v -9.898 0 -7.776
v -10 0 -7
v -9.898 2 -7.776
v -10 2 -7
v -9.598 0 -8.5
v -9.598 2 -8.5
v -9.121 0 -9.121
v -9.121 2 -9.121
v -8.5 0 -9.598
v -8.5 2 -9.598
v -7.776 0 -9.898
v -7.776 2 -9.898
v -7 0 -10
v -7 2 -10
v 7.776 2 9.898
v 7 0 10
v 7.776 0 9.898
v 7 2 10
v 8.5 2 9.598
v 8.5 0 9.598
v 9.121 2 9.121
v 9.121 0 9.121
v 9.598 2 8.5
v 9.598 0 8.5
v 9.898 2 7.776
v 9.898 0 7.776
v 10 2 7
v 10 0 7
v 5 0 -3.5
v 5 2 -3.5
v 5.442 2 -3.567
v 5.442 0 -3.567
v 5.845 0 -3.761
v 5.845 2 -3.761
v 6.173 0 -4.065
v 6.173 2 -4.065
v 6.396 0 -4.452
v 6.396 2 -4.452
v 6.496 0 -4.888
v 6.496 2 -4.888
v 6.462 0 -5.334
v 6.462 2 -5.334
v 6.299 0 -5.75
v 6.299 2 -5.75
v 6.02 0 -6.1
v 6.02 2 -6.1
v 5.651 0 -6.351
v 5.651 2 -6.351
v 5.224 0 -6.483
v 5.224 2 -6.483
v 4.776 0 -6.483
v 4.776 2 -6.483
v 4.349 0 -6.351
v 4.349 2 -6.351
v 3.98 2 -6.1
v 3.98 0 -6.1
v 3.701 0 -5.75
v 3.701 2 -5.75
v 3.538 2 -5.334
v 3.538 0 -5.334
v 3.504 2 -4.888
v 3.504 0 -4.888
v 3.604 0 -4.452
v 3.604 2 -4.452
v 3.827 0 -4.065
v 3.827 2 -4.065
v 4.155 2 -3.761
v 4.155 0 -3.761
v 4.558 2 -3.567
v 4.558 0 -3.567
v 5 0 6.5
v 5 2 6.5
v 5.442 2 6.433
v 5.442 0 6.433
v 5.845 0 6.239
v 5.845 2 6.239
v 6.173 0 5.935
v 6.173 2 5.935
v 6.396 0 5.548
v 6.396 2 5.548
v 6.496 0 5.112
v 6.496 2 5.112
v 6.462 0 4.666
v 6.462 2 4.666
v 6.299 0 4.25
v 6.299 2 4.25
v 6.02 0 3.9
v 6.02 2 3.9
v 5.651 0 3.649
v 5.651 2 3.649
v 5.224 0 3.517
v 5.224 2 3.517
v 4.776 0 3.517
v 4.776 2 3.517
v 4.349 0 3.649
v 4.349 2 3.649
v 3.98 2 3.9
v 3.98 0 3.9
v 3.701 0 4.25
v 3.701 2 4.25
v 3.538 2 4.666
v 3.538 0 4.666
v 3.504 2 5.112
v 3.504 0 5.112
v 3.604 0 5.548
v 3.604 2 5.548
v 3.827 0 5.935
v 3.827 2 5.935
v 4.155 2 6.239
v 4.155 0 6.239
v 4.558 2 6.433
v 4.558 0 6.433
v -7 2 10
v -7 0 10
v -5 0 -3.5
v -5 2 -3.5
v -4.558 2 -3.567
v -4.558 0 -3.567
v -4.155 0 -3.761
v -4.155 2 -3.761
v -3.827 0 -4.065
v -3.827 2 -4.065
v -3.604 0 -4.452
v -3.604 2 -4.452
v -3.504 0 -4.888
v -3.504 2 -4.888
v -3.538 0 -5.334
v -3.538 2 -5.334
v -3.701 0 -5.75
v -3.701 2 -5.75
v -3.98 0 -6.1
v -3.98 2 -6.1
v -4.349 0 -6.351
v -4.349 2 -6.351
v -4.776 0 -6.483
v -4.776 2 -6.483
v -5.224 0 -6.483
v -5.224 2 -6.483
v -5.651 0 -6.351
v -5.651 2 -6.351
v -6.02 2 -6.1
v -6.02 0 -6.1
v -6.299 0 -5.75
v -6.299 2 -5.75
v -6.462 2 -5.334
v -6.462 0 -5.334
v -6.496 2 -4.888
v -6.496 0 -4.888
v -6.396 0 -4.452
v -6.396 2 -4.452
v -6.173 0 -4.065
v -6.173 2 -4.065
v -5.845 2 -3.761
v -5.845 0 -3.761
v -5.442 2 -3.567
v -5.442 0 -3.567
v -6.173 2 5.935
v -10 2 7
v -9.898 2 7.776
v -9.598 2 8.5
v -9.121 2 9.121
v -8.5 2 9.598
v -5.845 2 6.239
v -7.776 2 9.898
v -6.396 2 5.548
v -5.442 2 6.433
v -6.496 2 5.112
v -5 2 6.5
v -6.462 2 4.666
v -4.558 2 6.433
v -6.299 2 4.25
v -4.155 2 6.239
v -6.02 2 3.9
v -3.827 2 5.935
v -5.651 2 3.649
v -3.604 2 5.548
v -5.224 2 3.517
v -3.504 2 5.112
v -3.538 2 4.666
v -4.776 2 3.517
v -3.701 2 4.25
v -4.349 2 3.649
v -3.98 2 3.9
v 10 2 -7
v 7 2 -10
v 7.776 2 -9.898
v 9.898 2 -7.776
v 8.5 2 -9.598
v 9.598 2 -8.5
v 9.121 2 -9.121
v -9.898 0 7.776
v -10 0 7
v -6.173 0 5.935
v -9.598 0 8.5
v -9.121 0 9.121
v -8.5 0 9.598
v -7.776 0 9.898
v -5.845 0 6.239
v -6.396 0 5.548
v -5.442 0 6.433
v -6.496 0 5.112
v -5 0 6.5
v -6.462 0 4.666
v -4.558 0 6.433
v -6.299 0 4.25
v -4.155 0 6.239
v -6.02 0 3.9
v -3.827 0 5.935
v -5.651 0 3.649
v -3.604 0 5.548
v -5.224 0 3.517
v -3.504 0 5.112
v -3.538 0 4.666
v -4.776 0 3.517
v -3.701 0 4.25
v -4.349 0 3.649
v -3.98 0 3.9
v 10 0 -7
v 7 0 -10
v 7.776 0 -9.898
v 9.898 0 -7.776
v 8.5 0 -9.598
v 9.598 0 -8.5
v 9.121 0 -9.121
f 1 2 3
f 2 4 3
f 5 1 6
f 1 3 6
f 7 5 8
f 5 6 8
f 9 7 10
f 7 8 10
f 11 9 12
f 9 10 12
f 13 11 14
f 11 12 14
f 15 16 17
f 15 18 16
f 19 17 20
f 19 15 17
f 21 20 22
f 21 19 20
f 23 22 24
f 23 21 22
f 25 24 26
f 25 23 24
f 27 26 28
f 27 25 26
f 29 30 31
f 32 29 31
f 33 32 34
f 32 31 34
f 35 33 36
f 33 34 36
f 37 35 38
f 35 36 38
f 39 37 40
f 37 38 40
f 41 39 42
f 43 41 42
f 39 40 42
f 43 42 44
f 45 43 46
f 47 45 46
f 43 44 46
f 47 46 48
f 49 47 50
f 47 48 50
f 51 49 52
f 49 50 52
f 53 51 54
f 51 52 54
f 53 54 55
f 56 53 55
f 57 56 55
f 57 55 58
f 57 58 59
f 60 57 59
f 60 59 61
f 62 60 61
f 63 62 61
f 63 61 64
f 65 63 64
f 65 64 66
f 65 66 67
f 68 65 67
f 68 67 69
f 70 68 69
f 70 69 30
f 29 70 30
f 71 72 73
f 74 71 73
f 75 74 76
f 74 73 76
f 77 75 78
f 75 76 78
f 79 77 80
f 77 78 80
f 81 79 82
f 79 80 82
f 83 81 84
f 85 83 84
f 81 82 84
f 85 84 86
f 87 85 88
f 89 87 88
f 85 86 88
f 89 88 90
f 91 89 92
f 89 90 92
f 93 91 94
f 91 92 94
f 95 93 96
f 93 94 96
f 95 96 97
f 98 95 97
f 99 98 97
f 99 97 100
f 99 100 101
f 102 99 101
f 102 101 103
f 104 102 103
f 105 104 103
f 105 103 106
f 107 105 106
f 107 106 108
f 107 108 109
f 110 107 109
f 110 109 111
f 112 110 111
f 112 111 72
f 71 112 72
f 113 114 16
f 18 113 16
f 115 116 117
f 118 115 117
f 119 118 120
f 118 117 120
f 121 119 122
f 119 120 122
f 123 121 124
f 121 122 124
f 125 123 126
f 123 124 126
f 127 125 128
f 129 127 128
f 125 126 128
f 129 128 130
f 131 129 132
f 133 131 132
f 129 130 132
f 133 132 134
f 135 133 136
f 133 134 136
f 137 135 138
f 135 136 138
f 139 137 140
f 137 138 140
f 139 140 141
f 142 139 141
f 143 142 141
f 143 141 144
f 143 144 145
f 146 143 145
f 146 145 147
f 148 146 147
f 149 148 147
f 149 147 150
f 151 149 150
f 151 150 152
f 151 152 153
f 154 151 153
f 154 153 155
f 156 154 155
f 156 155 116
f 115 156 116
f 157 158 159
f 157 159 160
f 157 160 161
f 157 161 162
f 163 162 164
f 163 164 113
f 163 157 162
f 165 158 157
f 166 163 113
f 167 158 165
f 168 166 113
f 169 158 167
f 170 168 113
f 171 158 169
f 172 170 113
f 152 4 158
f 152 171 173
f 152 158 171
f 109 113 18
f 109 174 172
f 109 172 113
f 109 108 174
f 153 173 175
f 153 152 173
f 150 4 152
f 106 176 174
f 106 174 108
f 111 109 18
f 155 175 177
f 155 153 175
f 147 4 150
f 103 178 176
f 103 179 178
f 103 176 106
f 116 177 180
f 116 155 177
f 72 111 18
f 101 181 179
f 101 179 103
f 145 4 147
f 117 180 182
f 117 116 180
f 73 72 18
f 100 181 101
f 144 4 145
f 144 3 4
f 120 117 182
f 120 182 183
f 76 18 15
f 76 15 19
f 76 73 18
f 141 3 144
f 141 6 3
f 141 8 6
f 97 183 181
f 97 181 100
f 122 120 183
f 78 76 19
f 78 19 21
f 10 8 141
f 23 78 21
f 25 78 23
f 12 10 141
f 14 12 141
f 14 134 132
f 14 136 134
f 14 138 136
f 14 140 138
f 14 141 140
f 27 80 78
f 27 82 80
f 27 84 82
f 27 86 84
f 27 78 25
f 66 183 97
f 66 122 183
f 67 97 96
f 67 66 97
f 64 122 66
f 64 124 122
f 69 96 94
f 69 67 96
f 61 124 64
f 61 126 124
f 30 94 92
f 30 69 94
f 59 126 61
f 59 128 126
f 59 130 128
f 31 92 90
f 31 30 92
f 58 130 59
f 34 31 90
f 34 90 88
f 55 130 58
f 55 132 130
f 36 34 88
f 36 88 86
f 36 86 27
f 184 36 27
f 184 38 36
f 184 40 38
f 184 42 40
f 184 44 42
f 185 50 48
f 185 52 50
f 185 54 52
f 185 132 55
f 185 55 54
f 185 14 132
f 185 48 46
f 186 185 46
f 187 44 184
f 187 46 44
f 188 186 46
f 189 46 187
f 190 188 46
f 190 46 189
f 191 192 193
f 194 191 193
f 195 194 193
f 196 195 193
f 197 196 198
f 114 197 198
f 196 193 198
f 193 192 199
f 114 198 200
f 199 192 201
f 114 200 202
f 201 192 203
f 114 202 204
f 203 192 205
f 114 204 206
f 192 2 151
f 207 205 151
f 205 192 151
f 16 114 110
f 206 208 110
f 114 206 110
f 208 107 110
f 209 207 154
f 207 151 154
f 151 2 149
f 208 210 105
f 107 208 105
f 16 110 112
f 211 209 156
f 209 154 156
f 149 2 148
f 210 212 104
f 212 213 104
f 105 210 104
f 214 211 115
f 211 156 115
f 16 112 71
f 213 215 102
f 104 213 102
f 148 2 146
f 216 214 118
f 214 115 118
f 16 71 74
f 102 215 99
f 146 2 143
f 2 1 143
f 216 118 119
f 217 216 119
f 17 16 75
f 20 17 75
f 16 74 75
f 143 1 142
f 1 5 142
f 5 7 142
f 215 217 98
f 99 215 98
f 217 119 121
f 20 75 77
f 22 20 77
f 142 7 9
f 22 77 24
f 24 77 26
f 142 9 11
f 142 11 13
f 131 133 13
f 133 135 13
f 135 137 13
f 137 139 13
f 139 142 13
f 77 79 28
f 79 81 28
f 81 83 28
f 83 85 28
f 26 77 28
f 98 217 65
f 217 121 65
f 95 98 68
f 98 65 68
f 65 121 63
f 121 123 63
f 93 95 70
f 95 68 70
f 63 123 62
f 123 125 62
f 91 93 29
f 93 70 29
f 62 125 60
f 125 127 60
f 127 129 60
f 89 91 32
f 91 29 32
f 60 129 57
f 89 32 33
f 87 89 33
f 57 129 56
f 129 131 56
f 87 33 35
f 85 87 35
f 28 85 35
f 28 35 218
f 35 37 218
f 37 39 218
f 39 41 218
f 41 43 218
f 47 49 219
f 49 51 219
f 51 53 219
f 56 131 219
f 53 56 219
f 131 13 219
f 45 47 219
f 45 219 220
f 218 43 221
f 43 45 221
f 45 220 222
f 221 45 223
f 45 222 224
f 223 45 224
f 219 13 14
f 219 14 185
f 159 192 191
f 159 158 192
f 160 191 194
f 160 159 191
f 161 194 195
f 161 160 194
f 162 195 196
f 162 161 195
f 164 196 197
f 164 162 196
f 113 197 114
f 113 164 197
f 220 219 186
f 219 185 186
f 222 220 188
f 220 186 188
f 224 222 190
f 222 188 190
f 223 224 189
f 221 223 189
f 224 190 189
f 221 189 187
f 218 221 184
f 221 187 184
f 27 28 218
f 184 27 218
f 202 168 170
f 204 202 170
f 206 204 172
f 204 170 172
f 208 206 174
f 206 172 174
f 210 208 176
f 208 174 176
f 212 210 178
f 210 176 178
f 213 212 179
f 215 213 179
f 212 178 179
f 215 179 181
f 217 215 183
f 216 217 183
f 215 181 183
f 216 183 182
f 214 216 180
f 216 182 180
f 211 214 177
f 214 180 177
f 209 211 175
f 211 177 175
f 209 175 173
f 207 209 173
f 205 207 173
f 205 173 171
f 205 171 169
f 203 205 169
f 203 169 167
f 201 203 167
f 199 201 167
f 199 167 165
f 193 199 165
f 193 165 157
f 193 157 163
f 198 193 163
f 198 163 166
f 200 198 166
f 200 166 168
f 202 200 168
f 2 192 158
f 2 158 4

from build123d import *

# Parameters (mm, degrees)
SKETCH_1_W          = 20
SKETCH_1_H          = 20
EXTRUDE_1_DEPTH     = 2
SKETCH_2_R          = 1.5
CUT_EXTRUDE_1_DEPTH = 15.282856857
FILLET_1_R          = 3


with BuildPart() as part:
    # 草图1 → 凸台-拉伸1 (new body)
    with BuildSketch(Plane(origin=(0, 0, 0), x_dir=(1, 0, 0), z_dir=(0, 1, 0))):
        Rectangle(SKETCH_1_W, SKETCH_1_H)
    extrude(amount=EXTRUDE_1_DEPTH)

    # 草图2 → 切除-拉伸1 (cut, through all)
    with BuildSketch(Plane(origin=(0, 2, 0), x_dir=(1, 0, 0), z_dir=(0, 1, 0))):
        with Locations(Location((-5, 5, 0), (0, 0, 270))):
            Circle(SKETCH_2_R)
        with Locations(Location((5, 5, 0), (0, 0, 270))):
            Circle(SKETCH_2_R)
        with Locations(Location((-5, -5, 0), (0, 0, 270))):
            Circle(SKETCH_2_R)
        with Locations(Location((5, -5, 0), (0, 0, 270))):
            Circle(SKETCH_2_R)
    extrude(amount=-CUT_EXTRUDE_1_DEPTH, mode=Mode.SUBTRACT)

    # 圆角1
    fillet_1_edges = [part.edges().sort_by_distance(p)[0] for p in [
        (10, 1, 10),
        (-10, 1, 10),
        (-10, 1, -10),
        (10, 1, -10),
    ]]
    fillet(fillet_1_edges, radius=FILLET_1_R)


solid = part.part
